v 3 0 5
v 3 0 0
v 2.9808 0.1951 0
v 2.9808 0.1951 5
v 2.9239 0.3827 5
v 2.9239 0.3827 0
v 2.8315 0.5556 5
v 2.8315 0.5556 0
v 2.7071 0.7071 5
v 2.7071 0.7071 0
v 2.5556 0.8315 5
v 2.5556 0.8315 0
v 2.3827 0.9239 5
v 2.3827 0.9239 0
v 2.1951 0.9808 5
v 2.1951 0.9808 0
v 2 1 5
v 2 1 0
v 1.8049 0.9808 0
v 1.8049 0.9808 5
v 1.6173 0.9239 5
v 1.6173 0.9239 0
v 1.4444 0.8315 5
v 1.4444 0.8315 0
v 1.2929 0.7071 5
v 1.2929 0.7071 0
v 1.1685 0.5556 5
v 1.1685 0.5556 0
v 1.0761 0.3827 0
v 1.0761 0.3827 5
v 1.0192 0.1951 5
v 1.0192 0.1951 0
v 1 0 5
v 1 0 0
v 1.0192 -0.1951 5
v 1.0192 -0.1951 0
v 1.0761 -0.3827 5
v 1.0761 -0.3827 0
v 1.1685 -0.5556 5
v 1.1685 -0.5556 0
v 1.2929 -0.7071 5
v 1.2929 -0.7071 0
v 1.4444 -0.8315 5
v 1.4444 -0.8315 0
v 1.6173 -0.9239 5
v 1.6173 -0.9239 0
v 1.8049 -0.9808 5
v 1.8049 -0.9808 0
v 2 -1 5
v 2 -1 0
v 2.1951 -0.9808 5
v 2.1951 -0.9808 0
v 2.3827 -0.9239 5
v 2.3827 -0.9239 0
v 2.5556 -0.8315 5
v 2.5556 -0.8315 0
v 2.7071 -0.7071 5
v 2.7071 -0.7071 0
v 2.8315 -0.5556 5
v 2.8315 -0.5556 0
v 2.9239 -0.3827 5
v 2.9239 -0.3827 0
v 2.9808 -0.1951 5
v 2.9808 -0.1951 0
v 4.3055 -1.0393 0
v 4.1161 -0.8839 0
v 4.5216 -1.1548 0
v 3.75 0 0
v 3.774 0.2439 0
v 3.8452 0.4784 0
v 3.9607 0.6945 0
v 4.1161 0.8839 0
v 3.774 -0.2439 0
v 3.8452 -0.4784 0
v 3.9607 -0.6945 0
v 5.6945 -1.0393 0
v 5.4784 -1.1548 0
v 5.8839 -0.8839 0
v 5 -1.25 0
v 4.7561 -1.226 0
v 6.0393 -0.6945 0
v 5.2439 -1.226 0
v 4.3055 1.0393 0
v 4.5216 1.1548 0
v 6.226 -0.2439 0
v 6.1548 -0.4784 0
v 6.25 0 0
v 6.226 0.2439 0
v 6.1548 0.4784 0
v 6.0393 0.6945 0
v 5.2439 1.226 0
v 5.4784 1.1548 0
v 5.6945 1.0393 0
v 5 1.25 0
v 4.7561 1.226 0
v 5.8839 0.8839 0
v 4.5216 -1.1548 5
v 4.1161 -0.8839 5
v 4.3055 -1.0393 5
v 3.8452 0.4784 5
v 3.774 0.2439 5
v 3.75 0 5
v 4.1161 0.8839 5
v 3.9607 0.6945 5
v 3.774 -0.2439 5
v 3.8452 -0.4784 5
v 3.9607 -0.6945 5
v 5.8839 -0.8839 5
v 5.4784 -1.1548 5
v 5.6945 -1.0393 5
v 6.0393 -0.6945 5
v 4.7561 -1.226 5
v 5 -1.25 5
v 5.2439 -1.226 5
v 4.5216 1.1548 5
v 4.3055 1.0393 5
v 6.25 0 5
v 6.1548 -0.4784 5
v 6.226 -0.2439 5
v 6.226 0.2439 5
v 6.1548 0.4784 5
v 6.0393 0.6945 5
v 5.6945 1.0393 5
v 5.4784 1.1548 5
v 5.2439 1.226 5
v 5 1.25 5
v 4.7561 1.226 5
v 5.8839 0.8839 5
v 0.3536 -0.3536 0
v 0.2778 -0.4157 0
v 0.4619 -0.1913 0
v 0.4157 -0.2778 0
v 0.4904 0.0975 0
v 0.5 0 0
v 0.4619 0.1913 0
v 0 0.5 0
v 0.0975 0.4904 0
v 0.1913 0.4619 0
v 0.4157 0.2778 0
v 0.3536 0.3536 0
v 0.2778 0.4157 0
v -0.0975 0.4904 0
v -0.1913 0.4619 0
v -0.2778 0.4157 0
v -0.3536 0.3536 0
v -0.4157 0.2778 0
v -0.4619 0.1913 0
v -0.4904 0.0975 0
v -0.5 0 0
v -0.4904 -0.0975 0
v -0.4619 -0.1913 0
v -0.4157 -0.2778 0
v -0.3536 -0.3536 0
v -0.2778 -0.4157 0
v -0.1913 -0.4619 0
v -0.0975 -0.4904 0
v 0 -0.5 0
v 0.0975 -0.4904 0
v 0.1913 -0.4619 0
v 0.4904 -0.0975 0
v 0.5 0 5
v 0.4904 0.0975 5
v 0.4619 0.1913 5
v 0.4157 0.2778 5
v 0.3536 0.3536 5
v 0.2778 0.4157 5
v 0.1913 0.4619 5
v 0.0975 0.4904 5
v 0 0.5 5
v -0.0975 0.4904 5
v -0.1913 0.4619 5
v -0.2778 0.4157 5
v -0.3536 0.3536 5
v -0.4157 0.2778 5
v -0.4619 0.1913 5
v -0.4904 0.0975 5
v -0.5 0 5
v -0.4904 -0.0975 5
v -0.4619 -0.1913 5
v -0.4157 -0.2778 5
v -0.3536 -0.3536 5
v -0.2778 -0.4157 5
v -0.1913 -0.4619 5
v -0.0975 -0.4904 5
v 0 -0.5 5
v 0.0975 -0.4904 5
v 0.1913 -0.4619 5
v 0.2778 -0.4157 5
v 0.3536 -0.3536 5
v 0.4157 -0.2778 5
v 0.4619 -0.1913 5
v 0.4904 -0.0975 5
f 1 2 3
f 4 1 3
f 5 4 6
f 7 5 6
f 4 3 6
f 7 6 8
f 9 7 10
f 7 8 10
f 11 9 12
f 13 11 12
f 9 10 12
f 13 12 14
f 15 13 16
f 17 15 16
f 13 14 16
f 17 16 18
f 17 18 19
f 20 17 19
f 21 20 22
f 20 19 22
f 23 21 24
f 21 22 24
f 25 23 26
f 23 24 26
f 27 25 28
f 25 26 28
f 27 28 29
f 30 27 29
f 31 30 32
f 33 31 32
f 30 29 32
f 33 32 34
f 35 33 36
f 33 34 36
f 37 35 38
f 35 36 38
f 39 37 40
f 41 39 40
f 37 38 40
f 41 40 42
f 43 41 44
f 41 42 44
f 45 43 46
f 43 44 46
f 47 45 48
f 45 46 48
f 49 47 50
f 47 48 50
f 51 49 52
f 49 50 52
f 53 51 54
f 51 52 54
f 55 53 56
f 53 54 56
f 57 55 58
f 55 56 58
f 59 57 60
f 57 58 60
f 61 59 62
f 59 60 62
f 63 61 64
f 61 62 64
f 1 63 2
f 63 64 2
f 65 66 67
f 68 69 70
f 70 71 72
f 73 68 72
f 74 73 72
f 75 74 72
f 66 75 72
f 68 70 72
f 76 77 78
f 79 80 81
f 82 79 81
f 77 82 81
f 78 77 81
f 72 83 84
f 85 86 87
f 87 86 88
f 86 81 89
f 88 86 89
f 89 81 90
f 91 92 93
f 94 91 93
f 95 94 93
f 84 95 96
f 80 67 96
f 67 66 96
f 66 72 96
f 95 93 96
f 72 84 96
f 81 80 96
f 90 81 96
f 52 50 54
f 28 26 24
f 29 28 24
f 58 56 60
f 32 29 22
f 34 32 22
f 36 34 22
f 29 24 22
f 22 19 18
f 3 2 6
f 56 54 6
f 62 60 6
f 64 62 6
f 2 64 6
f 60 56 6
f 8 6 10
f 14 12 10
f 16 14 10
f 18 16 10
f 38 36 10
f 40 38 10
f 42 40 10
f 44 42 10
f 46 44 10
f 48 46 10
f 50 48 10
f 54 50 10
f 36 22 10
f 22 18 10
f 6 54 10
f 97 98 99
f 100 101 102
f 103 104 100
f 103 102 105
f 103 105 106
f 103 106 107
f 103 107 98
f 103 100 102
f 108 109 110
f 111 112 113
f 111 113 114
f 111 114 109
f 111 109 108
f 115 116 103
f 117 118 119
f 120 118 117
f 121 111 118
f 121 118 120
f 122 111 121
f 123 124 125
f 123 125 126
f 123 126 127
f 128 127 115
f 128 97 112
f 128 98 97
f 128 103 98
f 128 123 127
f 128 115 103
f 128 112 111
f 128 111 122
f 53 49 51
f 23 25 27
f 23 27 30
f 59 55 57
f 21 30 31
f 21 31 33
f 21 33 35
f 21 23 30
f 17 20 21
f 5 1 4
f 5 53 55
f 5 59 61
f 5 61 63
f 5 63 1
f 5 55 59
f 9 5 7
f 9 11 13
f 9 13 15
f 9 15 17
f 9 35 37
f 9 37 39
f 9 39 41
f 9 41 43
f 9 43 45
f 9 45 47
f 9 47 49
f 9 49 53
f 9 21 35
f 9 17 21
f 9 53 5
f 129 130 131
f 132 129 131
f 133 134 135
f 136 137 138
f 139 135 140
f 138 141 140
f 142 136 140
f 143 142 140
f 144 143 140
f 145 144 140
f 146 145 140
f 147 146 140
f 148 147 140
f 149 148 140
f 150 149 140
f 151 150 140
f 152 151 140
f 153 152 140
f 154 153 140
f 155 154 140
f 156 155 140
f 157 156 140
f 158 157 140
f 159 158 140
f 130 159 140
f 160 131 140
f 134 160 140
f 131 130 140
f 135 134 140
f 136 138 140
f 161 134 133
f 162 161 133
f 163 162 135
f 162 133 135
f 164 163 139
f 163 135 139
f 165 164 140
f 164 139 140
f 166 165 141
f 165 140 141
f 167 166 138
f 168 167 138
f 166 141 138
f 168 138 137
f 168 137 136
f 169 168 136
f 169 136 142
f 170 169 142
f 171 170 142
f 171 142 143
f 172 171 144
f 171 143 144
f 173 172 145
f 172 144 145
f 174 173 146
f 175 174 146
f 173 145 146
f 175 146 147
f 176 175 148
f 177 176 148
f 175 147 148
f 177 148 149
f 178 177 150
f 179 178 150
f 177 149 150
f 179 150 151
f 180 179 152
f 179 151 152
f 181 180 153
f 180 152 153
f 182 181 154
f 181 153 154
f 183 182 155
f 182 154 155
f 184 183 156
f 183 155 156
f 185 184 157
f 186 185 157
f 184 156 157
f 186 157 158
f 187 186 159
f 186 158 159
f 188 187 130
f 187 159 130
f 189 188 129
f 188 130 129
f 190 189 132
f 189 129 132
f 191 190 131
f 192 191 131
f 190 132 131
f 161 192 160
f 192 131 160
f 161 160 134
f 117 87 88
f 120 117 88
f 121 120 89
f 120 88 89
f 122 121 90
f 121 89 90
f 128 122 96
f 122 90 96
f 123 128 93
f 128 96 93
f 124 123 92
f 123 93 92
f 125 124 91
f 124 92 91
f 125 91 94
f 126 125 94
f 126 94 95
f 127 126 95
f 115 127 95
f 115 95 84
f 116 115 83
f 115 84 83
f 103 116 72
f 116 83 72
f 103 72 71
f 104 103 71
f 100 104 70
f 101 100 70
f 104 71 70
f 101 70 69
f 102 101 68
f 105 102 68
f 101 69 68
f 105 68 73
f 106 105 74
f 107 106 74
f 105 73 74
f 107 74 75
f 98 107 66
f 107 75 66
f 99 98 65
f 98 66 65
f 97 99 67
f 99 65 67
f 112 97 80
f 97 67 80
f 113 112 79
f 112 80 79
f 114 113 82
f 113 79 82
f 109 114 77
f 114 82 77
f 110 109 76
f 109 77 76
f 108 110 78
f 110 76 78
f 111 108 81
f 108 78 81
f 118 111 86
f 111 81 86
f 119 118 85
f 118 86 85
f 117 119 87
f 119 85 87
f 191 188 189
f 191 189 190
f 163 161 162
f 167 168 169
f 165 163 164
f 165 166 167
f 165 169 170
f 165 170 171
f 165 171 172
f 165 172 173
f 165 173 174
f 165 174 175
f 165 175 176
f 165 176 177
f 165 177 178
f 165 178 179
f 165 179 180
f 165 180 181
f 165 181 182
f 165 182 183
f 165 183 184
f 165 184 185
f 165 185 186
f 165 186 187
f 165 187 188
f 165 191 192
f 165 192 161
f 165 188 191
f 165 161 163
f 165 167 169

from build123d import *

# Parameters (mm, degrees)
SKETCH1_R             = 0.5
BOSS_EXTRUDE1_DEPTH   = 5
SKETCH1_R_2           = 1
BOSS_EXTRUDE1_2_DEPTH = 5
SKETCH1_R_3           = 1.25
BOSS_EXTRUDE1_3_DEPTH = 5


with BuildPart() as part:
    # Sketch1 → Boss-Extrude1 (new body)
    with BuildSketch(Plane.XY):
        Circle(SKETCH1_R)
    extrude(amount=BOSS_EXTRUDE1_DEPTH)


with BuildPart() as body_2:
    # Sketch1 → Boss-Extrude1 2 (new body)
    with BuildSketch(Plane.XY):
        with Locations((2, 0)):
            Circle(SKETCH1_R_2)
    extrude(amount=BOSS_EXTRUDE1_2_DEPTH)


with BuildPart() as body_3:
    # Sketch1 → Boss-Extrude1 3 (new body)
    with BuildSketch(Plane.XY):
        with Locations((5, 0)):
            Circle(SKETCH1_R_3)
    extrude(amount=BOSS_EXTRUDE1_3_DEPTH)


solid = Compound([part.part, body_2.part, body_3.part])
